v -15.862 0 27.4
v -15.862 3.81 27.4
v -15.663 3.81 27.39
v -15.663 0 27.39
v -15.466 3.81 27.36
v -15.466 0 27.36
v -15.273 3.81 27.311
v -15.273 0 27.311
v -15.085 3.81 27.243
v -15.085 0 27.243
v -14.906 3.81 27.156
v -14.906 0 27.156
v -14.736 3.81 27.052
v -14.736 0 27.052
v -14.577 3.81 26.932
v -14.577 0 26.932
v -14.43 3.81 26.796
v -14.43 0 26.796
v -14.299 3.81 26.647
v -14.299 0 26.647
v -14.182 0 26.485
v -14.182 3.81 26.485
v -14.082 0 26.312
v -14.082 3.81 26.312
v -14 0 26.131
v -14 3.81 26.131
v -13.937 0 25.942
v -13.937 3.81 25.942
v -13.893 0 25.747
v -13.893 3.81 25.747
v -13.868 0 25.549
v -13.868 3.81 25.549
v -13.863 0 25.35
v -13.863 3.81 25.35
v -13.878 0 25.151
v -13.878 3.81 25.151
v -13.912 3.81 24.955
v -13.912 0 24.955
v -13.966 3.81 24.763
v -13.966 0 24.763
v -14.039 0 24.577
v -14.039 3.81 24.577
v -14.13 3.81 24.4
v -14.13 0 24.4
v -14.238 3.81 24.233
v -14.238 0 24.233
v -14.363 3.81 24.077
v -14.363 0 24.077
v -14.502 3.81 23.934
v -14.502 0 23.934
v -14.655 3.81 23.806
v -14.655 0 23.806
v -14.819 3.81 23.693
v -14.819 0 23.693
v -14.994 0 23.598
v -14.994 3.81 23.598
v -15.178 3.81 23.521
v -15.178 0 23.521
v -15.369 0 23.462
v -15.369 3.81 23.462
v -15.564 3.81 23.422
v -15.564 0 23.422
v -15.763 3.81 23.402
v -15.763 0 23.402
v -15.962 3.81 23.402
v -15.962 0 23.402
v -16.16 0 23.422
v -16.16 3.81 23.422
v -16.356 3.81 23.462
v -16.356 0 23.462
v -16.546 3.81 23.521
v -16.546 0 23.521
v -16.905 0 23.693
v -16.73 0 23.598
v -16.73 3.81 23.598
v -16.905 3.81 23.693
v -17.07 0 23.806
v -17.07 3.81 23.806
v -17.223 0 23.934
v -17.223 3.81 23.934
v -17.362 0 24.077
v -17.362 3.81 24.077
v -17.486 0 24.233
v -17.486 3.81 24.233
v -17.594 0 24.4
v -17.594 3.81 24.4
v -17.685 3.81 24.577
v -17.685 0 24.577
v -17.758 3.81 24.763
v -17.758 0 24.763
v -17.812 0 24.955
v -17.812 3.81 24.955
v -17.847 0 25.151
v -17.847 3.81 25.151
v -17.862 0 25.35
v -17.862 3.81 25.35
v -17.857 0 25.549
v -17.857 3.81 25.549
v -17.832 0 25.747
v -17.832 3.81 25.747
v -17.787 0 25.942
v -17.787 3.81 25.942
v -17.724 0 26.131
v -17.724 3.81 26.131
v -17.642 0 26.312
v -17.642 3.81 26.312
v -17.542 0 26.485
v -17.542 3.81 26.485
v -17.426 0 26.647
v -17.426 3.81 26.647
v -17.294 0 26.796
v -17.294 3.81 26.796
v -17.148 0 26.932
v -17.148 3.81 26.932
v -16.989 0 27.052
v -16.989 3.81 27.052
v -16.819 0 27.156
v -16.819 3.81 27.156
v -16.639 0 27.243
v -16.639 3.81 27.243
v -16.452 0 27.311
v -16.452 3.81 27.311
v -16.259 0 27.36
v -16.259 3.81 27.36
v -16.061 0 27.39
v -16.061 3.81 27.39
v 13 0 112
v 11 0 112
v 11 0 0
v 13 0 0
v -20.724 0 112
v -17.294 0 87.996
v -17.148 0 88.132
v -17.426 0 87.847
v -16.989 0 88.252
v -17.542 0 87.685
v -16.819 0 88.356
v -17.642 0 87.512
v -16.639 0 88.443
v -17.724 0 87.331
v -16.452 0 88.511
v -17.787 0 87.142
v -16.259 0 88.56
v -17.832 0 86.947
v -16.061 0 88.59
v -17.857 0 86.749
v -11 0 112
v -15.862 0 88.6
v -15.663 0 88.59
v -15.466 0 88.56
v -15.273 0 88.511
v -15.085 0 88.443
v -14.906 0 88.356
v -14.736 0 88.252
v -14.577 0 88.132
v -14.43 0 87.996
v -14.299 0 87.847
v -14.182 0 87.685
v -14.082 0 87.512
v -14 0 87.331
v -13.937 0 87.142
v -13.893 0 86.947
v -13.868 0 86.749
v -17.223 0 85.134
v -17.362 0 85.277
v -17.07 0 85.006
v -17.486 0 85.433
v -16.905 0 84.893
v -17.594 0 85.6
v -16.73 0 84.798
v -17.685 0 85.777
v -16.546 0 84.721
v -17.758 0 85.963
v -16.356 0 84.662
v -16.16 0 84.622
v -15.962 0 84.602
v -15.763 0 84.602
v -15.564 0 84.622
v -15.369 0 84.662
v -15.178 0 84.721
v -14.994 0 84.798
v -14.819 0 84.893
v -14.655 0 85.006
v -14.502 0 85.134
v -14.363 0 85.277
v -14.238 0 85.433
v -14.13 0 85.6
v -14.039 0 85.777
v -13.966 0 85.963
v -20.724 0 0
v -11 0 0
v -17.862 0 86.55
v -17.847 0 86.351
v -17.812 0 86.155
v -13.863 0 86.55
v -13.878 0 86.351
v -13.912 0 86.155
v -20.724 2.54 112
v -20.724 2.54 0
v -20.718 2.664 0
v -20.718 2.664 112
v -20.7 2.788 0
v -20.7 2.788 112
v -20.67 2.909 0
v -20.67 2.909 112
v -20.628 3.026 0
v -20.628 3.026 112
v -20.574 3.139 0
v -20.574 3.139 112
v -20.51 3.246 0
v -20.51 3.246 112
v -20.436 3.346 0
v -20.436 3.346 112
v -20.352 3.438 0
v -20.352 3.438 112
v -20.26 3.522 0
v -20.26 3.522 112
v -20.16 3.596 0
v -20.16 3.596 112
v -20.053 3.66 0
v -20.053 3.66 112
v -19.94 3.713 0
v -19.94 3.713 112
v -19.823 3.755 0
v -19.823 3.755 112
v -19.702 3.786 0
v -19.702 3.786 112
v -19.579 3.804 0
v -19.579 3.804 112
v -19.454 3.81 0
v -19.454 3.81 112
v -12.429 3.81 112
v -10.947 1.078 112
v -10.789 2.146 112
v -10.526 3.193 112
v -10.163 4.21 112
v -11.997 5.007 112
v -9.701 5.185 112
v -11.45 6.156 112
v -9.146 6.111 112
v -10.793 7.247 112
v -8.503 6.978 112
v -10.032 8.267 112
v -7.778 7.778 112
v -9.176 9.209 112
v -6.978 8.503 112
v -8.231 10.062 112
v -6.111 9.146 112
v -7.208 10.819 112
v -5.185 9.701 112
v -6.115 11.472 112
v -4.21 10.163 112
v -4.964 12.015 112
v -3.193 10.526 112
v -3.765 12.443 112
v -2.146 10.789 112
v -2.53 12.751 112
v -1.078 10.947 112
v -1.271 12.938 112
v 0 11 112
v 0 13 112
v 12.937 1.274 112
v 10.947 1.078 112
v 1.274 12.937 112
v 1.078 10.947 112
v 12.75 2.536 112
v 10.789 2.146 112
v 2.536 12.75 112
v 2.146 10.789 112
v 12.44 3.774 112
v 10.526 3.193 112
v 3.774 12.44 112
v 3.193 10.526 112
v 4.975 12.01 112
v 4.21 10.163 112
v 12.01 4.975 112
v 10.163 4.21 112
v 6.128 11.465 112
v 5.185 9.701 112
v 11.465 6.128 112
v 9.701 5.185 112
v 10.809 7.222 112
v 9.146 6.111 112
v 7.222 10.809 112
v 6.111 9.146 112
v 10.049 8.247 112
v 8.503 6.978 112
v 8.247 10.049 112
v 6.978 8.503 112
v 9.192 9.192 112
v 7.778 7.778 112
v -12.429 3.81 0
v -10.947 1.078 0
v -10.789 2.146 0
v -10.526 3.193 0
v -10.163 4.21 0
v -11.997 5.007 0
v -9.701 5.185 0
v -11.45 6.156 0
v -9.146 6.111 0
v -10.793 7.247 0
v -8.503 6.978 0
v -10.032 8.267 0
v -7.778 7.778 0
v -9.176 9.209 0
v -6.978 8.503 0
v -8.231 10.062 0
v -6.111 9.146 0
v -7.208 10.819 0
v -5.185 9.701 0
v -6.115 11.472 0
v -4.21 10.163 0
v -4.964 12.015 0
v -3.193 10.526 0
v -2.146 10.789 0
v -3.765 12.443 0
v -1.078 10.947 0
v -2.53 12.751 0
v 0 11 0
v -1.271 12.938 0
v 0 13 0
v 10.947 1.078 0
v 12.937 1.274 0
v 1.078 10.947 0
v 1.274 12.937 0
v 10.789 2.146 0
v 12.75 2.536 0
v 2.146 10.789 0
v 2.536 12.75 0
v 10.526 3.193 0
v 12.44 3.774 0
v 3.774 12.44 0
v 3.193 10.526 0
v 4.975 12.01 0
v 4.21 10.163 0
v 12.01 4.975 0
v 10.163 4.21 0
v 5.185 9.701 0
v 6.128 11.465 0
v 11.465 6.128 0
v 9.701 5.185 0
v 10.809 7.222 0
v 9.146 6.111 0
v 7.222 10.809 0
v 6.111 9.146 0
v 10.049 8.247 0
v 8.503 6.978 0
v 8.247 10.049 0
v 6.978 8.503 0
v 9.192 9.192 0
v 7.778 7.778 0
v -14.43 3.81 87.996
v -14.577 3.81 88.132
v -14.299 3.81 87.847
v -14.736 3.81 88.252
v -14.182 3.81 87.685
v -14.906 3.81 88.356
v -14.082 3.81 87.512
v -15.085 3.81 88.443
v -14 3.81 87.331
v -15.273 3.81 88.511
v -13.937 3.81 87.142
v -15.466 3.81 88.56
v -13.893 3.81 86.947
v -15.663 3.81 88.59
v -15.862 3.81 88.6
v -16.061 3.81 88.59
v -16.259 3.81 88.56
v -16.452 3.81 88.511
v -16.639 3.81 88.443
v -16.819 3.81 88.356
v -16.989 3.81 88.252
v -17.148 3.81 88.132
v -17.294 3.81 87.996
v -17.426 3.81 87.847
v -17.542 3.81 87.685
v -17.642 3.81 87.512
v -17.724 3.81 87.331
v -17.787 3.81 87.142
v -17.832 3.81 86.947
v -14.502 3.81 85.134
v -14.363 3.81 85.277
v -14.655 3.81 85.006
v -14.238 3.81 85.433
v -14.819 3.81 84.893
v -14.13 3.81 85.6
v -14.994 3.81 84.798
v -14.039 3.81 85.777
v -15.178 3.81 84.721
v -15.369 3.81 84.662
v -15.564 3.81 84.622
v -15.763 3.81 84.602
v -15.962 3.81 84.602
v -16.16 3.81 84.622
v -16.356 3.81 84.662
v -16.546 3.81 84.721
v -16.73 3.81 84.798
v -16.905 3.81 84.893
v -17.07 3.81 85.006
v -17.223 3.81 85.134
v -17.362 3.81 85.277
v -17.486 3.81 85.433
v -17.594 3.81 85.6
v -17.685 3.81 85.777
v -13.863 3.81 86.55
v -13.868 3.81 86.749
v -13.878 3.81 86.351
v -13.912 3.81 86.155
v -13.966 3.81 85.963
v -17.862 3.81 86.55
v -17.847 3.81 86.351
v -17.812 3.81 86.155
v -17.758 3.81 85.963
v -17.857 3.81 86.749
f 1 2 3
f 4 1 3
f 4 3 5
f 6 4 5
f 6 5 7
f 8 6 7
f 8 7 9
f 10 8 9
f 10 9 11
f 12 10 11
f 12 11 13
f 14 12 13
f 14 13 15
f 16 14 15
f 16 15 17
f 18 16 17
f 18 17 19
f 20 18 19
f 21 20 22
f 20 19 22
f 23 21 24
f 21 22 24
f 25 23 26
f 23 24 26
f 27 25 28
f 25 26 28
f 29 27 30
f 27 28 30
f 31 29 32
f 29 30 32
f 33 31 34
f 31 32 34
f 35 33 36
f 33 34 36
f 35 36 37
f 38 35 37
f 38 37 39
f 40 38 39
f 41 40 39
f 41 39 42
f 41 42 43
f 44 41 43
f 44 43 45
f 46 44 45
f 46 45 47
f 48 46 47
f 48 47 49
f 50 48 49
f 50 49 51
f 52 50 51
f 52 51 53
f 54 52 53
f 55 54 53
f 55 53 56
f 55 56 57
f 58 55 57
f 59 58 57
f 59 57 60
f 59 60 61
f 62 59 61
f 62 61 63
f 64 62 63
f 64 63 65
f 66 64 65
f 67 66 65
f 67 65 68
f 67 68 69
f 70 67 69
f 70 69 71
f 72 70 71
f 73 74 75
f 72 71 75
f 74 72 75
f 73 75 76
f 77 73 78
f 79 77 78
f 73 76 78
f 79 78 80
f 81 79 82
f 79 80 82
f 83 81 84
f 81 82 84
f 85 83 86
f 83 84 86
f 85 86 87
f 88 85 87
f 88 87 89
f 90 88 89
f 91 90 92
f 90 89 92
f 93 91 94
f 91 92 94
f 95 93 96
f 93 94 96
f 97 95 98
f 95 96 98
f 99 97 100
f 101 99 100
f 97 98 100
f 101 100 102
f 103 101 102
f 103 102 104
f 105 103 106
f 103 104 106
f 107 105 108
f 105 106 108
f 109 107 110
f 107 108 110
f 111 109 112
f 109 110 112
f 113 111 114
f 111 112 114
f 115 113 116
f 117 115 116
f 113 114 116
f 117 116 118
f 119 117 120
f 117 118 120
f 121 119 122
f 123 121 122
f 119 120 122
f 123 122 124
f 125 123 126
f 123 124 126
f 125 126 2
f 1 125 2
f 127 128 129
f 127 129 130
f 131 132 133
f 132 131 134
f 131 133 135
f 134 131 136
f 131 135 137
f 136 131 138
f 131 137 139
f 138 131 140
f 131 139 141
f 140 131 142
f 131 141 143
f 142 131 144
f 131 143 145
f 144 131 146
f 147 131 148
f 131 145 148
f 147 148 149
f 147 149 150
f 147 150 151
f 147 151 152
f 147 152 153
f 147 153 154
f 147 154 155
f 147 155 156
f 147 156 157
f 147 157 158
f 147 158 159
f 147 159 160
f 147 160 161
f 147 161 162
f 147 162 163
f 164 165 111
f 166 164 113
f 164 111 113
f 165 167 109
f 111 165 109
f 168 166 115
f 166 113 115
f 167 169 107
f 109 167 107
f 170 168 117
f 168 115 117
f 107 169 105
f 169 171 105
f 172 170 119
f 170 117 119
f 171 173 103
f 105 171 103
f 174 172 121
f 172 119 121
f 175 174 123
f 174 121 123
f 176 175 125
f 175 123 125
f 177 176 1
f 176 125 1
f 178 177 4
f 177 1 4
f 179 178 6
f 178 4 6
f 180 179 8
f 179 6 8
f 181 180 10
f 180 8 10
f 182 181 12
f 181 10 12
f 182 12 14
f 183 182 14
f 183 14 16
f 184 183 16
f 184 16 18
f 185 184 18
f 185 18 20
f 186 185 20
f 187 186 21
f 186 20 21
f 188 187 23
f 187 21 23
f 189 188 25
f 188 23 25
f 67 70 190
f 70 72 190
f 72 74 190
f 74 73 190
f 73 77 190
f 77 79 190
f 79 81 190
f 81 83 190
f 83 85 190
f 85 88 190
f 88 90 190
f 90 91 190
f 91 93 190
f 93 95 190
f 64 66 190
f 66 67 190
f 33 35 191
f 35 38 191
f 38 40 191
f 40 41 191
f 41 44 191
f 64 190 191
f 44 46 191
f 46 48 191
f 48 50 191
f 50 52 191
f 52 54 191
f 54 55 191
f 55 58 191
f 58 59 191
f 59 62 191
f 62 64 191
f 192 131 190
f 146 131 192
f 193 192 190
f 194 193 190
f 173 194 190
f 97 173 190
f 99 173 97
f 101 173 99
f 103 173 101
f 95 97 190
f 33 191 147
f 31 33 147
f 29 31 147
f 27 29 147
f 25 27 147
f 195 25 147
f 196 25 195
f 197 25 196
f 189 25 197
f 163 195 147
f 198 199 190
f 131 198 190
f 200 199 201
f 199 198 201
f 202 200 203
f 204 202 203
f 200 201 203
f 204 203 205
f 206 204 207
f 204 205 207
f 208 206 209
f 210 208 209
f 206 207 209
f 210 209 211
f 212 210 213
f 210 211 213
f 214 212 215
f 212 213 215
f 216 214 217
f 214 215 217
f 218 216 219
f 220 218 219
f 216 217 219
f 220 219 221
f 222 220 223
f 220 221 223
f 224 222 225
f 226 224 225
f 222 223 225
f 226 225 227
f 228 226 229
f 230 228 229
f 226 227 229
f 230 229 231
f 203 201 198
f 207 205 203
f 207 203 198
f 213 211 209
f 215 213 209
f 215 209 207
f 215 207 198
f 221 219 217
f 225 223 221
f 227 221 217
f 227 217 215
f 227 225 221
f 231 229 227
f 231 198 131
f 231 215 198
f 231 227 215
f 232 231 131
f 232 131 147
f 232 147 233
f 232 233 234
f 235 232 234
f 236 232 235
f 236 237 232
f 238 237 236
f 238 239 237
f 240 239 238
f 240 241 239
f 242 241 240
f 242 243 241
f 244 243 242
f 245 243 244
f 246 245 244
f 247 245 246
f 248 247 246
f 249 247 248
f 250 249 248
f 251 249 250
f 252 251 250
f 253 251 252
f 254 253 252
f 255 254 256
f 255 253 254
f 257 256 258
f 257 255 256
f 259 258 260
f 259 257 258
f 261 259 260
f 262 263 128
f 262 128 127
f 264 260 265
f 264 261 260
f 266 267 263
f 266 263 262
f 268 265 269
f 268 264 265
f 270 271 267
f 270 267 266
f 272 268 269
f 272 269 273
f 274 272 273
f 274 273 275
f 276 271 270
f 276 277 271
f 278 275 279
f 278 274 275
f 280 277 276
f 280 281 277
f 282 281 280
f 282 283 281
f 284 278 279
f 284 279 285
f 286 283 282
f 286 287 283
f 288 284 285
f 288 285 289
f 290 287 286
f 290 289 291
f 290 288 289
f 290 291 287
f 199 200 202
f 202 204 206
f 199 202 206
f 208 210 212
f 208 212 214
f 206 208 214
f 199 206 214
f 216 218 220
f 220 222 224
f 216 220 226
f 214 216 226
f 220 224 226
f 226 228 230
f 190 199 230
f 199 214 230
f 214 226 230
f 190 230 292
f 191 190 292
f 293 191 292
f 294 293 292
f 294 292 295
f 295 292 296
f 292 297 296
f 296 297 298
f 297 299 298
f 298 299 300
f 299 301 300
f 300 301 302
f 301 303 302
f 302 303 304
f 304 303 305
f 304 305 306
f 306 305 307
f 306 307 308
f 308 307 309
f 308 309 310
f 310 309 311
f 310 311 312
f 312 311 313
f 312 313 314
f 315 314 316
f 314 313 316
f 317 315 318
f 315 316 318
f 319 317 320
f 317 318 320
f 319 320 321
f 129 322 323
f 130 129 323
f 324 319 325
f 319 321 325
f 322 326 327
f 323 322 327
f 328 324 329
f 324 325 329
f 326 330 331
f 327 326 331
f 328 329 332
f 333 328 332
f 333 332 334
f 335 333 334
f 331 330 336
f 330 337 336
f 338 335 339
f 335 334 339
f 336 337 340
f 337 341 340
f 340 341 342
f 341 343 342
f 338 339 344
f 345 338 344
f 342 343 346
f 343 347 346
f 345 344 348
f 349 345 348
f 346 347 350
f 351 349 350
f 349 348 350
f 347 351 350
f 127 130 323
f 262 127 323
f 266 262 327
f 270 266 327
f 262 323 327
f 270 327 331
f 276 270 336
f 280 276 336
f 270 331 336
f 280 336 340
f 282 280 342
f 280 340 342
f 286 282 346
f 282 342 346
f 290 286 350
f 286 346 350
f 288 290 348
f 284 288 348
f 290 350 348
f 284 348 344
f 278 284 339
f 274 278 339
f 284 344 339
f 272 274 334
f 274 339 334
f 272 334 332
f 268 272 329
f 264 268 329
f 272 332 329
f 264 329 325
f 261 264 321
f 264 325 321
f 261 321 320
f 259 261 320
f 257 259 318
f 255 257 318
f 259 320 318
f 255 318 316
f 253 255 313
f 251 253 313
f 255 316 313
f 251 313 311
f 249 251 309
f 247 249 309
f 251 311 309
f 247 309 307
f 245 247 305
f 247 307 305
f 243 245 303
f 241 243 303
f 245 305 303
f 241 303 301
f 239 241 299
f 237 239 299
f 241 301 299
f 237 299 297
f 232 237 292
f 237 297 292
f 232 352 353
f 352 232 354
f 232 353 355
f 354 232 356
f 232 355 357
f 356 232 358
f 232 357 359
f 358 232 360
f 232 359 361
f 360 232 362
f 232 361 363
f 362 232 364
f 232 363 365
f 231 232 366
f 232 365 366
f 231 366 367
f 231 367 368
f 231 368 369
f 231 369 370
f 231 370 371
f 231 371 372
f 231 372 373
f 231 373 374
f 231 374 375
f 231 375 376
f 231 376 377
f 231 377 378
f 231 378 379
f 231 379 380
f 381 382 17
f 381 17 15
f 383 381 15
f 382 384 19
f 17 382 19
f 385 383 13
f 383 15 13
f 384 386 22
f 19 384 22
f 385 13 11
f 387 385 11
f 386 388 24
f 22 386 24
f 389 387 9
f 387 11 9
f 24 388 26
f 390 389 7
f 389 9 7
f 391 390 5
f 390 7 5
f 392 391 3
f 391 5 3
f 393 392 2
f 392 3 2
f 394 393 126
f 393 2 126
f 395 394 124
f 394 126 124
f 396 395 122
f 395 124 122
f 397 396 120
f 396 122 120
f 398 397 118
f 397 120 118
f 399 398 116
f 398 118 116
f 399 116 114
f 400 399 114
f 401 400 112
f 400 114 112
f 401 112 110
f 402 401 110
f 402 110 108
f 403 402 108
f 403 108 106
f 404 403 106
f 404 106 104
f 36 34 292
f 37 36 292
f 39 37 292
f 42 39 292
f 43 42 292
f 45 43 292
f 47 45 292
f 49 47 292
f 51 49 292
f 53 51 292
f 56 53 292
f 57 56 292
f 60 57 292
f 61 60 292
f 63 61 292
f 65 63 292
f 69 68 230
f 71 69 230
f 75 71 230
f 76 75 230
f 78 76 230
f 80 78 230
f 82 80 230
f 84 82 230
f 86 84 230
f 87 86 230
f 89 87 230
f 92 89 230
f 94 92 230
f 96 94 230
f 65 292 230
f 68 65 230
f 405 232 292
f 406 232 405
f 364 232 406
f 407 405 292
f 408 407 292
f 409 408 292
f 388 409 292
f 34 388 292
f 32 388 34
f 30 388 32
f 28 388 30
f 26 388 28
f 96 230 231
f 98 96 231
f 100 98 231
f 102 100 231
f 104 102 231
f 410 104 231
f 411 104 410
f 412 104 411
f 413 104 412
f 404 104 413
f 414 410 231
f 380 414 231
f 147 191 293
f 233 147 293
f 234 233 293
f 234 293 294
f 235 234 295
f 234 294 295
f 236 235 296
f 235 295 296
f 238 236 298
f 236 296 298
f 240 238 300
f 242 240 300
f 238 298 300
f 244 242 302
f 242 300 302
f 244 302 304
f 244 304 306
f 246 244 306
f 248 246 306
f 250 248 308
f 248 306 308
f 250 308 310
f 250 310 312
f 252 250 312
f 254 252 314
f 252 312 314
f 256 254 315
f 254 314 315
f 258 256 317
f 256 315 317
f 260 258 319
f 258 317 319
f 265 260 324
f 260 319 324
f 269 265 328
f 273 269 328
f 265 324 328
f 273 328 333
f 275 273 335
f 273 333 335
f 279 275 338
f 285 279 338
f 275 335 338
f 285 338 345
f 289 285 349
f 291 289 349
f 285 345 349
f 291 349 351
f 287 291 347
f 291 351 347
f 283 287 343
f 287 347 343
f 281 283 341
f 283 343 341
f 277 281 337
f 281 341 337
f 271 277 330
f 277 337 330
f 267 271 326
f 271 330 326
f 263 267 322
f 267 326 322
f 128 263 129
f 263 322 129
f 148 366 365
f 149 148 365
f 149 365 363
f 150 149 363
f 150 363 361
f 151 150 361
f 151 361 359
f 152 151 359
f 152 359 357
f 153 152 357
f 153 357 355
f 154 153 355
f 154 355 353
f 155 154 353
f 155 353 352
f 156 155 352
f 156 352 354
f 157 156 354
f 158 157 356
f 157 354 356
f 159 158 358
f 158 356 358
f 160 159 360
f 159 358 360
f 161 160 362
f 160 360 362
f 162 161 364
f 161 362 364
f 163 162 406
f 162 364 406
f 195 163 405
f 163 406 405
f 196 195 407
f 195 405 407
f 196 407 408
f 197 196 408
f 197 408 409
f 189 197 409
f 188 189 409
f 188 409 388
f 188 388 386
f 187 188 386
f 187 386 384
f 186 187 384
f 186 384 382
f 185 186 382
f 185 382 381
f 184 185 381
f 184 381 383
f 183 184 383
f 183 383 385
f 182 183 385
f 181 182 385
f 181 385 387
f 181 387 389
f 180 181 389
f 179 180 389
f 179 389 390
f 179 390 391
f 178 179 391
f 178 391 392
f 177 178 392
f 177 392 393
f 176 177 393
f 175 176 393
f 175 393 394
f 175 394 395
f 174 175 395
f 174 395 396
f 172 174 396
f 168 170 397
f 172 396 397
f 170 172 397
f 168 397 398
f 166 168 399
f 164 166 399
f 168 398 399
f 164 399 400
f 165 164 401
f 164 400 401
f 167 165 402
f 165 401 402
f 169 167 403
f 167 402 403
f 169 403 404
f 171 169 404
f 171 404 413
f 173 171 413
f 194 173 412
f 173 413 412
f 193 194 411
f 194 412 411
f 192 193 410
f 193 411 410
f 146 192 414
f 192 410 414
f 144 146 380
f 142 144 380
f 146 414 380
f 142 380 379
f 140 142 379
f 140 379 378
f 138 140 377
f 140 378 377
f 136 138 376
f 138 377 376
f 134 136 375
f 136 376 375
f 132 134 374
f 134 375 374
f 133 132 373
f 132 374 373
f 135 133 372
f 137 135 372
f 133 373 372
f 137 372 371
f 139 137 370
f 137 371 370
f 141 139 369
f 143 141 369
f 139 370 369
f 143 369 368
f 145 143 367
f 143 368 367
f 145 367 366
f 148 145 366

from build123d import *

# Parameters (mm, degrees)
BOSS_EXTRUDE1_DEPTH = 112
SKETCH3_R           = 2
CUT_EXTRUDE2_DEPTH  = 115.271427971
FILLET1_R           = 1.27


with BuildPart() as part:
    # Sketch1 → Boss-Extrude1 (new body)
    with BuildSketch(Plane.XY):
        with BuildLine():
            ThreePointArc((-12.429155241, 3.81), (-12.856496765, 1.926263465), (-13, 0))
            Line((-13, 0), (-11, 0))
            ThreePointArc((-11, 0), (0, 11), (11, 0))
            Line((11, 0), (13, 0))
            ThreePointArc((13, 0), (9.192388155, 9.192388155), (0, 13))
            ThreePointArc((0, 13), (-7.728842087, 10.452990003), (-12.429155241, 3.81))
        make_face()
        with BuildLine():
            Line((-20.724457785, 0), (-13, 0))
            ThreePointArc((-13, 0), (-12.856496765, 1.926263465), (-12.429155241, 3.81))
            Line((-12.429155241, 3.81), (-20.724457785, 3.81))
            Line((-20.724457785, 3.81), (-20.724457785, 0))
        make_face()
    extrude(amount=BOSS_EXTRUDE1_DEPTH)

    # Sketch3 → Cut-Extrude2 (cut, through all)
    with BuildSketch(Plane(origin=(0, 3.81, 0), x_dir=(1, 0, 0), z_dir=(0, 1, 0))):
        with Locations(Location((-15.862228893, -25.4, 0), (0, 0, 270))):
            Circle(SKETCH3_R)
        with Locations(Location((-15.862228893, -86.6, 0), (0, 0, 270))):
            Circle(SKETCH3_R)
    extrude(amount=-CUT_EXTRUDE2_DEPTH, mode=Mode.SUBTRACT)

    # Fillet1
    fillet1_edges = [part.edges().sort_by_distance(p)[0] for p in [
        (-20.724457785, 3.81, 56),
    ]]
    fillet(fillet1_edges, radius=FILLET1_R)


solid = part.part
